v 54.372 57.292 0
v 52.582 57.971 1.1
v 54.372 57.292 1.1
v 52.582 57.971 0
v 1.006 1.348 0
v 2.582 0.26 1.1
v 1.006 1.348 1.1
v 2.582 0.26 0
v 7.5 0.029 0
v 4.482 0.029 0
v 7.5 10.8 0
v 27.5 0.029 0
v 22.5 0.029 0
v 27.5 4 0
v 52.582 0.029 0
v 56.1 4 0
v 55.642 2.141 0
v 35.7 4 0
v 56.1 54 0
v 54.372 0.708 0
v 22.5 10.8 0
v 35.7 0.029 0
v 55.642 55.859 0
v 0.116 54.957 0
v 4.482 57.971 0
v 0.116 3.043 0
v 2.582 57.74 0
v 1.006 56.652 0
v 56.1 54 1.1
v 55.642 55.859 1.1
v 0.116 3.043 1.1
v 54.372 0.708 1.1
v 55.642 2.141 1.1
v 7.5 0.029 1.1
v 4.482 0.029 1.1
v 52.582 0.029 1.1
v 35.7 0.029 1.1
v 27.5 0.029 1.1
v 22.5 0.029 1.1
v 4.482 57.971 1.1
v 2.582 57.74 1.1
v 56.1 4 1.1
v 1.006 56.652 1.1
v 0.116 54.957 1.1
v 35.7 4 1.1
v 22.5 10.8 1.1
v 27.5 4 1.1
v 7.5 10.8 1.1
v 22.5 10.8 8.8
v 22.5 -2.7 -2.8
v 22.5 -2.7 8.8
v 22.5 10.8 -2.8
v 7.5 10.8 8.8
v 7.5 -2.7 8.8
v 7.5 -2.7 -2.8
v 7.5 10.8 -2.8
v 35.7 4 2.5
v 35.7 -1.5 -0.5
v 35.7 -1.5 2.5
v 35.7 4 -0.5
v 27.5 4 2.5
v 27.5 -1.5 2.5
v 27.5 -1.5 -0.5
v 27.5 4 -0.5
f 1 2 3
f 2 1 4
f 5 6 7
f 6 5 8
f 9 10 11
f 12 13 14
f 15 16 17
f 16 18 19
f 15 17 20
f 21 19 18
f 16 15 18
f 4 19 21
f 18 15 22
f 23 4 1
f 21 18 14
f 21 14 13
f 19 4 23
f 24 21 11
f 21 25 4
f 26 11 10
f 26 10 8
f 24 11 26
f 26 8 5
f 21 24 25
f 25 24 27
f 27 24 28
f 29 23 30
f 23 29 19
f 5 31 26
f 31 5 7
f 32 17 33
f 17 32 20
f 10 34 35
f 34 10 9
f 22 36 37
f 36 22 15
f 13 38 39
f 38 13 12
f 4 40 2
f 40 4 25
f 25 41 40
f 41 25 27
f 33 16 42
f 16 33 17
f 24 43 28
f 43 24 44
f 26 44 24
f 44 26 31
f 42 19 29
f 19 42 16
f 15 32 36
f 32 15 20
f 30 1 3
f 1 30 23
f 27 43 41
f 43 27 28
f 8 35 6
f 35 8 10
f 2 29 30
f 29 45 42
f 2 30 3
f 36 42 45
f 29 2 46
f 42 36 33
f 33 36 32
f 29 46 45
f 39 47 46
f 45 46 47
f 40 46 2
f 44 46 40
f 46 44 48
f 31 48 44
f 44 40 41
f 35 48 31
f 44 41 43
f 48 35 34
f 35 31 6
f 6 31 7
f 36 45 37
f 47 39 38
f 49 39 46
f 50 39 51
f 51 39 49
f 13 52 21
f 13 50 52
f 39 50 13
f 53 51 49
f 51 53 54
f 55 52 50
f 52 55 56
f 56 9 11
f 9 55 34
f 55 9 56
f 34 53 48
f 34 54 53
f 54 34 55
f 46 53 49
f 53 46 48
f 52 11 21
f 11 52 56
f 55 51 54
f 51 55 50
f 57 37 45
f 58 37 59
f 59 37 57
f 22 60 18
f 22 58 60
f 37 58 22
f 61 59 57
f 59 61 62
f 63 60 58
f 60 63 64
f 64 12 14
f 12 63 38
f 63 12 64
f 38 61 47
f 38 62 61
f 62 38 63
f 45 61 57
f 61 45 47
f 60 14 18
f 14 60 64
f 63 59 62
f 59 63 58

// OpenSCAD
E=0.001;

TPW = 48.1;
TPL = 50;
TPH = 1.1;

ETHSize	= [15, 13.5, 11.6];
ETHPos = [7.5, -2.7, -2.8];
USBMiniSize = [8.2, 5.5, 3];
USBMiniPos = [27.5, -1.5, -0.5];

//translate([0,0,0]) cube([10, 20, 1]);
roundrect(size=[TPW, TPL, TPH], r=4, fit=0);
translate(ETHPos) cube(size=ETHSize);
translate(USBMiniPos) cube(size=USBMiniSize);

module roundrect(size=[0,0,0], r=1, center=0, fit=1) {
	assign(sx = size[0]- (fit* (2*r)), sy = size[1] - (fit * (2*r)))
	translate([-center*size[0]/2, -center*size[1]/2, -center*size[2]/2])
	linear_extrude(height=size[2], slices=1)
	hull() {
		translate([r,r,0])
			for (x=[0:1]) for (y=[0:1]) 
				translate([x*sx, y*sy, 0])
					circle(r=r);
	}
}
